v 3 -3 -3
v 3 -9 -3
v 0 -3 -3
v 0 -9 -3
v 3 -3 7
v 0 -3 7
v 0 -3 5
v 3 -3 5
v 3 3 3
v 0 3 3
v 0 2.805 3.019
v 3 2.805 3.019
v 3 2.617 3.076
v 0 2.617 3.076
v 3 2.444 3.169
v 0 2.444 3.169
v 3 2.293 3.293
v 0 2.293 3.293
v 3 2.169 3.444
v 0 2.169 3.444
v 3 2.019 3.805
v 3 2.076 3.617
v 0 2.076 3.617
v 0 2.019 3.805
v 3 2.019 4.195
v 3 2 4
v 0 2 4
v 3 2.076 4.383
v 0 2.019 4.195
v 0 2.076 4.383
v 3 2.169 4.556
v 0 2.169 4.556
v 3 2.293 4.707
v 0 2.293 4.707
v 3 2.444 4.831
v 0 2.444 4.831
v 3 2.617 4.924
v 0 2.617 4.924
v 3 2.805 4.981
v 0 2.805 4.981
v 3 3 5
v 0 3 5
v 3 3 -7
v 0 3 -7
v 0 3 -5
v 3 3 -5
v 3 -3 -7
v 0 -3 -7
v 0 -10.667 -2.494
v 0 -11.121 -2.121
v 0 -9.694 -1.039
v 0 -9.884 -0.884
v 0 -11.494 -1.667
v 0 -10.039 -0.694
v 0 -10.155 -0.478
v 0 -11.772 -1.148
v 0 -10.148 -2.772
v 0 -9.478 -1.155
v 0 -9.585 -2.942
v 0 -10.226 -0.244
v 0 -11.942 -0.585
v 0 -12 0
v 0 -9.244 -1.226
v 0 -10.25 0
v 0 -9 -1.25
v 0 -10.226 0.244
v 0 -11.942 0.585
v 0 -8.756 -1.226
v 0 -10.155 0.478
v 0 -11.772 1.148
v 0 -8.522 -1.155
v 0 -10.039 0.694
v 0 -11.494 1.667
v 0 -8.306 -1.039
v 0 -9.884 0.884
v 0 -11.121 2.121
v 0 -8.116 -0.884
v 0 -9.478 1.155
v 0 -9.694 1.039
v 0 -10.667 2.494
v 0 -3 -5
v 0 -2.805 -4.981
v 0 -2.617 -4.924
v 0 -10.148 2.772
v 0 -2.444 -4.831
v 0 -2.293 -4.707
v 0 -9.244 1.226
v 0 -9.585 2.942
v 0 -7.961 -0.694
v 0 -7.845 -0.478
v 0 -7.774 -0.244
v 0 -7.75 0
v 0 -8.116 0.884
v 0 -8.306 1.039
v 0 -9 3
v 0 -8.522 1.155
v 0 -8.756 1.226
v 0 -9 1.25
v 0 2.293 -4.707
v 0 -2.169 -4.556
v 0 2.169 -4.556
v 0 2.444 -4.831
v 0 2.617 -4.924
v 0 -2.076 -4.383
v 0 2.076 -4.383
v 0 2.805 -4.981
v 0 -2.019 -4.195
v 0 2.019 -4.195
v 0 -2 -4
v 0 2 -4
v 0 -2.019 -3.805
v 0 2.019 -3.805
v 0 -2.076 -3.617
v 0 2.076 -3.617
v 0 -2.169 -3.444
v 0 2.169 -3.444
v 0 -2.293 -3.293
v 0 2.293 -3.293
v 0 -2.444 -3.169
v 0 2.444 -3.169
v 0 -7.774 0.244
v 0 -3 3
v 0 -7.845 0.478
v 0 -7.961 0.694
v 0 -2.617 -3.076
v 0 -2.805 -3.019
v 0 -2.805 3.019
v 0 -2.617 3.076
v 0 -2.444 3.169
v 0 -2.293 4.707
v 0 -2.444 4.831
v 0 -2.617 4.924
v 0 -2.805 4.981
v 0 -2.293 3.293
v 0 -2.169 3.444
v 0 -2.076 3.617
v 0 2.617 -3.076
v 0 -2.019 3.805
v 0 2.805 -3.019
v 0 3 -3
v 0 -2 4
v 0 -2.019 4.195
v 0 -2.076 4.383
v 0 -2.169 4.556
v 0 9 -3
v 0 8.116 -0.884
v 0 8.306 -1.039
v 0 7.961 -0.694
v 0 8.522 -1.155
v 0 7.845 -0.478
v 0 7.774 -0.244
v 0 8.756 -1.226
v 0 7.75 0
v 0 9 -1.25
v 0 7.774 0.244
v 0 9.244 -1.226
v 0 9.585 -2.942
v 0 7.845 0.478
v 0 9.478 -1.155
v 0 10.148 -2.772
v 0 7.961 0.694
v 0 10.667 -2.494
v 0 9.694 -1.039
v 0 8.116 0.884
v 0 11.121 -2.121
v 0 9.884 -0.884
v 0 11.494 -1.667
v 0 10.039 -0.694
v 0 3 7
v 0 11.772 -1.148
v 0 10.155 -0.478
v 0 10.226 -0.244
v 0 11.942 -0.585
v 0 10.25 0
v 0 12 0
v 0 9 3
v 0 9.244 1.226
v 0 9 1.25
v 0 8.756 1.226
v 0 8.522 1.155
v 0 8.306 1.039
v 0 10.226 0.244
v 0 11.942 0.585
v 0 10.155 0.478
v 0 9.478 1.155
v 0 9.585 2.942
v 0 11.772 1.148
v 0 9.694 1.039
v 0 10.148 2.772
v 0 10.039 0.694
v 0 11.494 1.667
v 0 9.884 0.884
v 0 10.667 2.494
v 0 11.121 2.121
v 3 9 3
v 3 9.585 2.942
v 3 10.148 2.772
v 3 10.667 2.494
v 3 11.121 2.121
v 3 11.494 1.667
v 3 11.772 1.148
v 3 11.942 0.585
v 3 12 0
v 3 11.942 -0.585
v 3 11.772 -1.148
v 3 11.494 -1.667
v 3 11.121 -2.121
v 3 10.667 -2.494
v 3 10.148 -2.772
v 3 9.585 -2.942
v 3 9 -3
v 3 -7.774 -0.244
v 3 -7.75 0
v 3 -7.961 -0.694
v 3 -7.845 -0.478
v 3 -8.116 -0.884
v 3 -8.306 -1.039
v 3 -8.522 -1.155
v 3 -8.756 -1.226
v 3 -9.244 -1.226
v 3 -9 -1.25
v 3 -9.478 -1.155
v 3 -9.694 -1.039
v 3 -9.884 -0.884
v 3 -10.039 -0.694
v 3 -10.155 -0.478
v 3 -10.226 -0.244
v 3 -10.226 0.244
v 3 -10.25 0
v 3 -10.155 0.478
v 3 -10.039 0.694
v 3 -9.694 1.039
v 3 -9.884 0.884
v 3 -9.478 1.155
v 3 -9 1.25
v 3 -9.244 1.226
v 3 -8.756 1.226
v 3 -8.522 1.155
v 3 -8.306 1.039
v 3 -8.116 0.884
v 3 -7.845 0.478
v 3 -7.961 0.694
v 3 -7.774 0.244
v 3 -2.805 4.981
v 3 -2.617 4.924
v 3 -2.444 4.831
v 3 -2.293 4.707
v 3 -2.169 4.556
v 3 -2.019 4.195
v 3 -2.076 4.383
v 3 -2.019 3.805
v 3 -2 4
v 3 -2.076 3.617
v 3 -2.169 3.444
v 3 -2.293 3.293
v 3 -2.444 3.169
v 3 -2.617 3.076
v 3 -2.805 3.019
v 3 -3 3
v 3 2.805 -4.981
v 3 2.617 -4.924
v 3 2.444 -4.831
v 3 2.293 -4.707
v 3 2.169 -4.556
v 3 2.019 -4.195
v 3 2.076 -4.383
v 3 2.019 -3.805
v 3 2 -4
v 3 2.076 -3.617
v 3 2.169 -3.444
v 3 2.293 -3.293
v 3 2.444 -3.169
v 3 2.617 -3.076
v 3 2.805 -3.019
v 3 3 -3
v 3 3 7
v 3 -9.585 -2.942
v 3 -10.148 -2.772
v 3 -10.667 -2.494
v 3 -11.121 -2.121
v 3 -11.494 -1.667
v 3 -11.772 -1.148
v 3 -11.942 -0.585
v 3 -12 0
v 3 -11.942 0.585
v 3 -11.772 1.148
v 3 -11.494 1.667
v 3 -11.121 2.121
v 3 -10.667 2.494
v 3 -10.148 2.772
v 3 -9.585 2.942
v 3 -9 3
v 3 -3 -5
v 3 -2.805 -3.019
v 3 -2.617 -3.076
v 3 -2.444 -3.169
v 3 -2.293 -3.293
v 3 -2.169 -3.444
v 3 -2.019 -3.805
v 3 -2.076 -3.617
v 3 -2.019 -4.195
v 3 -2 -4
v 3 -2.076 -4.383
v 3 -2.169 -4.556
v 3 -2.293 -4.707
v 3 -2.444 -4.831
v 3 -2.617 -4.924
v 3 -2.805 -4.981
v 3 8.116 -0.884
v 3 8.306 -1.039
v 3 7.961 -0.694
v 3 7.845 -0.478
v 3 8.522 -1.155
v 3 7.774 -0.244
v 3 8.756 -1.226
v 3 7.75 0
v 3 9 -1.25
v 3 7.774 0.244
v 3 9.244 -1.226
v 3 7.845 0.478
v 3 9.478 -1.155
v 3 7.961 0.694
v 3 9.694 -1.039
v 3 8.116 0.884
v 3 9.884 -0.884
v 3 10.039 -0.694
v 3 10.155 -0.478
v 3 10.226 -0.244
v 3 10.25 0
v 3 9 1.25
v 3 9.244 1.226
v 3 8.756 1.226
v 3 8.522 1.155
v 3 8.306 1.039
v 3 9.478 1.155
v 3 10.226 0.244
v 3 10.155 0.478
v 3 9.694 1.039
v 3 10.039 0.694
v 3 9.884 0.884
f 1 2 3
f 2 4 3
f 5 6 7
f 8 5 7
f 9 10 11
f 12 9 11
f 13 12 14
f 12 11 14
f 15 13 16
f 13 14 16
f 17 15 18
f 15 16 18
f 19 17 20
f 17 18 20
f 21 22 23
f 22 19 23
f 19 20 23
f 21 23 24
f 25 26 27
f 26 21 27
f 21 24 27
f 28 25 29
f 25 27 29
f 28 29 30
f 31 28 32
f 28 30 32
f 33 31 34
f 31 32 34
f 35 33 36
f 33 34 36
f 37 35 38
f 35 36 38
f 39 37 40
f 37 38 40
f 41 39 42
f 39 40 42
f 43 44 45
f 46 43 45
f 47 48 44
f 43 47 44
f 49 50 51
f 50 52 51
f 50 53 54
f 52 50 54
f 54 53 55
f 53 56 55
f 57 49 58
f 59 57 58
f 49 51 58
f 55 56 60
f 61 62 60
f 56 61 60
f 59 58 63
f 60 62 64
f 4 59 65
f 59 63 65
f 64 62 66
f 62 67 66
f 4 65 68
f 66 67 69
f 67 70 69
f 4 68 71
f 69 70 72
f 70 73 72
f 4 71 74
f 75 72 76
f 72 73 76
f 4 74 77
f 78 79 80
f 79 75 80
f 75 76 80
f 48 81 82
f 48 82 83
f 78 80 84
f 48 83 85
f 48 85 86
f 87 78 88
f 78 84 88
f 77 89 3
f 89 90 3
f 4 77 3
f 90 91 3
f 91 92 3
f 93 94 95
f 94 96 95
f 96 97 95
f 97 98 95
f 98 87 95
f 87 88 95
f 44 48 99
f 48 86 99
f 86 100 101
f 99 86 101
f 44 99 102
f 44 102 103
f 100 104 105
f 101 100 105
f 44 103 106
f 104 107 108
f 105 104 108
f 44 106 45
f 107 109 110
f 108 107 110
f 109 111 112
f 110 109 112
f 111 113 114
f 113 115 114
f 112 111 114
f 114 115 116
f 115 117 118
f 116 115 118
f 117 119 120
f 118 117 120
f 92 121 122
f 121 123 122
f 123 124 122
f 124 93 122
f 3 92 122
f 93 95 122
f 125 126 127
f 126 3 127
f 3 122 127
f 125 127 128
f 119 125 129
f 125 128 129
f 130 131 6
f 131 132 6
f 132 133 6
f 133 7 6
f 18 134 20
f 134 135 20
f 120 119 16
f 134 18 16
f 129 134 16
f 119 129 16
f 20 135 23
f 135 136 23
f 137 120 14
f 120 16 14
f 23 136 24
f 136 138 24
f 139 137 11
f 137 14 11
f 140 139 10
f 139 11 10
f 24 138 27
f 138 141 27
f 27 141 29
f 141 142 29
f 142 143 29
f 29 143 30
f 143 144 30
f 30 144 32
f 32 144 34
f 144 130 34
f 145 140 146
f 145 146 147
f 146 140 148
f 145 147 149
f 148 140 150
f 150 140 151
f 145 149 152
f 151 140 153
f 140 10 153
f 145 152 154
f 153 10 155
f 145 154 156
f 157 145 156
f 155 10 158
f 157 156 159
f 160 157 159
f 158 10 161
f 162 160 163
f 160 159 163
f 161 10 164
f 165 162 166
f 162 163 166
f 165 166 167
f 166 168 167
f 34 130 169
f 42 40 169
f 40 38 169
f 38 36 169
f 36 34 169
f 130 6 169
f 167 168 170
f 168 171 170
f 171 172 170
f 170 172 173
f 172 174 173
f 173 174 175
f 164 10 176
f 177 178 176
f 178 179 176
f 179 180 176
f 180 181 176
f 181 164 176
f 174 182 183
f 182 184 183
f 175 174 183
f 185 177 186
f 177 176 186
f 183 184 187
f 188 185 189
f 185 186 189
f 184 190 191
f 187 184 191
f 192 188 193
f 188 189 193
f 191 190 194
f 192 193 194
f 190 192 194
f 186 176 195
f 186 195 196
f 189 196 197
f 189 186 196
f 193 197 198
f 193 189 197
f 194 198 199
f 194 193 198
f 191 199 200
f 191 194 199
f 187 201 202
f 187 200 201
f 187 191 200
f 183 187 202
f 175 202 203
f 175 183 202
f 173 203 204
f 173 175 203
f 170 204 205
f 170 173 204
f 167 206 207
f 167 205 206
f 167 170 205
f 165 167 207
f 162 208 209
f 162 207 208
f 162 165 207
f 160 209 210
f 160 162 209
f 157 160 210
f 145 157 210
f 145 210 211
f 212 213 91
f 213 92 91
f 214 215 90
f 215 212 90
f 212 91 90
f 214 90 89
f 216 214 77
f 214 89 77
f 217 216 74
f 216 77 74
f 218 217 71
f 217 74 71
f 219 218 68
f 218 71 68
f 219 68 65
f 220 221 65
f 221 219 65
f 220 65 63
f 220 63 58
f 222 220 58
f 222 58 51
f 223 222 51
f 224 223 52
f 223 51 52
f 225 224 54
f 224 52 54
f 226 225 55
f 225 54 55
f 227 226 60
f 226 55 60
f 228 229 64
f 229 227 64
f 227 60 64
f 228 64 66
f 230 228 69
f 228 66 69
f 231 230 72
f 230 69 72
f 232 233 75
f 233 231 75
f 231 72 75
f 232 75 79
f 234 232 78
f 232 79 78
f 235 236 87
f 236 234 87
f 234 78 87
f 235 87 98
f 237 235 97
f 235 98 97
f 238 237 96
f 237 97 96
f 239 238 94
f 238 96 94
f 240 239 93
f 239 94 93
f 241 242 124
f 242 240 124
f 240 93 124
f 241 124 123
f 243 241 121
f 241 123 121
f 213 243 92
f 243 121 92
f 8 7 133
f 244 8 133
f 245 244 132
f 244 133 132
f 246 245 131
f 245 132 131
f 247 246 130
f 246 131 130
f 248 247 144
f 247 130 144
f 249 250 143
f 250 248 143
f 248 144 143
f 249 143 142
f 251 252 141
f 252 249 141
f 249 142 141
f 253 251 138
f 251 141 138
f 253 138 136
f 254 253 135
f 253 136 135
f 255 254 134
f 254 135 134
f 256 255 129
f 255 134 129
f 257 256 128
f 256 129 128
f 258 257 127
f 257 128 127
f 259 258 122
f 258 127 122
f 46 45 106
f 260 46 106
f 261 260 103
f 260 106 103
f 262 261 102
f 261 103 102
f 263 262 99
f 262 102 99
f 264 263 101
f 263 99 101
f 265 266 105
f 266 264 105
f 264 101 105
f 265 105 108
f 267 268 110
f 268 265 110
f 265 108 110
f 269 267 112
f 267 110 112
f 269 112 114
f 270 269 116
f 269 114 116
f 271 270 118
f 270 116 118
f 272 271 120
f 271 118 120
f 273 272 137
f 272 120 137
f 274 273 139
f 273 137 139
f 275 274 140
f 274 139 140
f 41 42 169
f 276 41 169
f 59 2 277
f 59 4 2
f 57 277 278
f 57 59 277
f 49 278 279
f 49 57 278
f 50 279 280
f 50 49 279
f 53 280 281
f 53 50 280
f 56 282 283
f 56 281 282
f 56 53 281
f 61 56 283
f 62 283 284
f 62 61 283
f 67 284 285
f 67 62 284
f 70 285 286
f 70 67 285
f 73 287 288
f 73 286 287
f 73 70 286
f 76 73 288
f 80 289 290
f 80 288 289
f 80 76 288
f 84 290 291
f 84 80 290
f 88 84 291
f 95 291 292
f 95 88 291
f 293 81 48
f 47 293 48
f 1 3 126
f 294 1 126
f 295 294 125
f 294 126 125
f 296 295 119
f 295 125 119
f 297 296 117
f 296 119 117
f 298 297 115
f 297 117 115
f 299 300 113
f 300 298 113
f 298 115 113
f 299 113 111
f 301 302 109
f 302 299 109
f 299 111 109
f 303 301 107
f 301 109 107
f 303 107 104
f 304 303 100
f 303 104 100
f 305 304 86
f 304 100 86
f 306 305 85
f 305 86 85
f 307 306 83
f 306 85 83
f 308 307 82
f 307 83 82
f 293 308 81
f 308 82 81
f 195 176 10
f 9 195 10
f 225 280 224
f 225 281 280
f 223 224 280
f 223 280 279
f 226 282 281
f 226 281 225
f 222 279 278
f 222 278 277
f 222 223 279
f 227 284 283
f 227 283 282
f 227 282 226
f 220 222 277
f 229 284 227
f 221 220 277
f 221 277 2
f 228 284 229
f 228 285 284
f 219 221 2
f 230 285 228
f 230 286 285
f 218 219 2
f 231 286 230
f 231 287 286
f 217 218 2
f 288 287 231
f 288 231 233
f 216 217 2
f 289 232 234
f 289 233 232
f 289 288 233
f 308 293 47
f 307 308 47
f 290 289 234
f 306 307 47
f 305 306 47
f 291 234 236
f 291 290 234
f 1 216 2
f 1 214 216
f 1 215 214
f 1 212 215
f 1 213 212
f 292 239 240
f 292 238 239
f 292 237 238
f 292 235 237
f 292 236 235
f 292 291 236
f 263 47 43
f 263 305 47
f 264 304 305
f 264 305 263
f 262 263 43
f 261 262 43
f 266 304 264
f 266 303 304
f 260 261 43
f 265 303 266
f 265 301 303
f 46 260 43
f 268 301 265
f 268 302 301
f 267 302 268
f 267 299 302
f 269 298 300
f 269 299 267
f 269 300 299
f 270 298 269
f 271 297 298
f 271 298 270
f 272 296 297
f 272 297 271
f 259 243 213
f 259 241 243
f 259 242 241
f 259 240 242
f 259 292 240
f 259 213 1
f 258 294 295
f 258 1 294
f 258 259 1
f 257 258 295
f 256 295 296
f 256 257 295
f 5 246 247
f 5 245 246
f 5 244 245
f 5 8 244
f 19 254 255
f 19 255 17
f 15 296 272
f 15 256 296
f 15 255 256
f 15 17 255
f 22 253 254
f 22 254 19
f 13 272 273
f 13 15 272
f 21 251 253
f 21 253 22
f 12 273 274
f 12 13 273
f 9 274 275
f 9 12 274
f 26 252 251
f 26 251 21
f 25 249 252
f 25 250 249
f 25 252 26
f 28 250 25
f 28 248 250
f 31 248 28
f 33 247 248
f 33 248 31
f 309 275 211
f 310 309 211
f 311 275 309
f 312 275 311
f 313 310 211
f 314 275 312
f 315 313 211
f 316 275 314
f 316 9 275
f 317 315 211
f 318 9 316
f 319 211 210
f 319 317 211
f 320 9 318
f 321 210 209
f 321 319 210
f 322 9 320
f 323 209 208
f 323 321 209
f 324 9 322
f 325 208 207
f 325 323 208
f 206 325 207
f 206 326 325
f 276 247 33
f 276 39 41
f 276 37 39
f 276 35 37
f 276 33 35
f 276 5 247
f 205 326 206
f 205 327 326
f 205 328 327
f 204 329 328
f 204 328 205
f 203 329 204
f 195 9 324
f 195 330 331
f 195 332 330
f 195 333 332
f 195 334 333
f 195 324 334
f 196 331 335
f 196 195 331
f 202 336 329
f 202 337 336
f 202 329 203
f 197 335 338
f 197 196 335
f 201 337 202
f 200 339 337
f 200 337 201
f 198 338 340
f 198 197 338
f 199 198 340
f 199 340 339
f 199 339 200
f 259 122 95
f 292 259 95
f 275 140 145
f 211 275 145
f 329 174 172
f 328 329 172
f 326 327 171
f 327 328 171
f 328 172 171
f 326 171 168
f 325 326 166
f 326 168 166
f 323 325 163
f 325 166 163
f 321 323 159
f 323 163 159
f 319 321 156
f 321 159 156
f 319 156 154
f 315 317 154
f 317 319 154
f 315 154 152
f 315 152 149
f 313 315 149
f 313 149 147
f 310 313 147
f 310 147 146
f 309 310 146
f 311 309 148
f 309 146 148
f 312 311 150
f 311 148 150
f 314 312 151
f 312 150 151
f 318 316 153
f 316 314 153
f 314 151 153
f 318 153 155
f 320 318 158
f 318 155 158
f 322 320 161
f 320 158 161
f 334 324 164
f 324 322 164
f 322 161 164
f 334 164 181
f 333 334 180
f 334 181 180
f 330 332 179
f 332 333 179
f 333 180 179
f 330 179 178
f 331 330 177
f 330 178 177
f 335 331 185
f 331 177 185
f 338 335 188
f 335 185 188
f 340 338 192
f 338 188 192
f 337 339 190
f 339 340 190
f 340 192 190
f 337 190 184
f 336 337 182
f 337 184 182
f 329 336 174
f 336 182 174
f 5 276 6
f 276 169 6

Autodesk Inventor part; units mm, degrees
ref_plane "YZ Plane" through (0, 0, 0) normal (1, 0, 0) x (0, 1, 0)
ref_plane "XZ Plane" through (0, 0, 0) normal (0, 1, 0) x (-1, 0, 0)
ref_plane "XY Plane" through (0, 0, 0) normal (0, 0, 1) x (1, 0, 0)
sketch "スケッチ1" plane through (0, 0, 0) normal (1, 0, 0) x (0, 1, 0)
  line L0 (9, 0) -> (-9, 0) construction
  line L1 (9, 3) -> (-9, 3)
  line L2 (-9, -3) -> (9, -3)
  arc A0 (9, -3) -> (9, 3) centre (9, 0) ccw
  arc A1 (-9, 3) -> (-9, -3) centre (-9, 0) ccw
  line L3 (3, 7) -> (-3, 7)
  line L4 (-3, -7) -> (3, -7)
  line L5 (3, 7) -> (-3, -7) construction
  line L6 (-3, 7) -> (3, -7) construction
  arc A2 (3, 5) -> (3, 3) centre (3, 4) ccw
  arc A3 (-3, 3) -> (-3, 5) centre (-3, 4) ccw
  arc A4 (-3, -5) -> (-3, -3) centre (-3, -4) ccw
  arc A5 (3, -3) -> (3, -5) centre (3, -4) ccw
  line L7 (-3, 7) -> (-3, 5)
  line L8 (3, 5) -> (3, 7)
  line L9 (3, -7) -> (3, -5)
  line L10 (3, -3) -> (3, 3)
  line L11 (-3, 3) -> (-3, -3)
  line L12 (-3, -5) -> (-3, -7)
  circle A6 centre (-9, 0) radius 1.25
  circle A7 centre (9, 0) radius 1.25
  point P0 (0, 0)
  dimension "d0" = 6
  dimension "d1" = 6
  dimension "d2" = 1
  dimension "d3" = 14
  dimension "d4" = 18
  dimension "d7" = 0
  dimension "d8" = 6
  dimension "d9" = 4
  dimension "d10" = 6
  dimension "d11" = 2.5
  dimension "d12" = 2.5
extrude "押し出し1" add sketch "スケッチ1" along normal blind 3
properties part number "tip" material "アルミニウム 2014-T4"
